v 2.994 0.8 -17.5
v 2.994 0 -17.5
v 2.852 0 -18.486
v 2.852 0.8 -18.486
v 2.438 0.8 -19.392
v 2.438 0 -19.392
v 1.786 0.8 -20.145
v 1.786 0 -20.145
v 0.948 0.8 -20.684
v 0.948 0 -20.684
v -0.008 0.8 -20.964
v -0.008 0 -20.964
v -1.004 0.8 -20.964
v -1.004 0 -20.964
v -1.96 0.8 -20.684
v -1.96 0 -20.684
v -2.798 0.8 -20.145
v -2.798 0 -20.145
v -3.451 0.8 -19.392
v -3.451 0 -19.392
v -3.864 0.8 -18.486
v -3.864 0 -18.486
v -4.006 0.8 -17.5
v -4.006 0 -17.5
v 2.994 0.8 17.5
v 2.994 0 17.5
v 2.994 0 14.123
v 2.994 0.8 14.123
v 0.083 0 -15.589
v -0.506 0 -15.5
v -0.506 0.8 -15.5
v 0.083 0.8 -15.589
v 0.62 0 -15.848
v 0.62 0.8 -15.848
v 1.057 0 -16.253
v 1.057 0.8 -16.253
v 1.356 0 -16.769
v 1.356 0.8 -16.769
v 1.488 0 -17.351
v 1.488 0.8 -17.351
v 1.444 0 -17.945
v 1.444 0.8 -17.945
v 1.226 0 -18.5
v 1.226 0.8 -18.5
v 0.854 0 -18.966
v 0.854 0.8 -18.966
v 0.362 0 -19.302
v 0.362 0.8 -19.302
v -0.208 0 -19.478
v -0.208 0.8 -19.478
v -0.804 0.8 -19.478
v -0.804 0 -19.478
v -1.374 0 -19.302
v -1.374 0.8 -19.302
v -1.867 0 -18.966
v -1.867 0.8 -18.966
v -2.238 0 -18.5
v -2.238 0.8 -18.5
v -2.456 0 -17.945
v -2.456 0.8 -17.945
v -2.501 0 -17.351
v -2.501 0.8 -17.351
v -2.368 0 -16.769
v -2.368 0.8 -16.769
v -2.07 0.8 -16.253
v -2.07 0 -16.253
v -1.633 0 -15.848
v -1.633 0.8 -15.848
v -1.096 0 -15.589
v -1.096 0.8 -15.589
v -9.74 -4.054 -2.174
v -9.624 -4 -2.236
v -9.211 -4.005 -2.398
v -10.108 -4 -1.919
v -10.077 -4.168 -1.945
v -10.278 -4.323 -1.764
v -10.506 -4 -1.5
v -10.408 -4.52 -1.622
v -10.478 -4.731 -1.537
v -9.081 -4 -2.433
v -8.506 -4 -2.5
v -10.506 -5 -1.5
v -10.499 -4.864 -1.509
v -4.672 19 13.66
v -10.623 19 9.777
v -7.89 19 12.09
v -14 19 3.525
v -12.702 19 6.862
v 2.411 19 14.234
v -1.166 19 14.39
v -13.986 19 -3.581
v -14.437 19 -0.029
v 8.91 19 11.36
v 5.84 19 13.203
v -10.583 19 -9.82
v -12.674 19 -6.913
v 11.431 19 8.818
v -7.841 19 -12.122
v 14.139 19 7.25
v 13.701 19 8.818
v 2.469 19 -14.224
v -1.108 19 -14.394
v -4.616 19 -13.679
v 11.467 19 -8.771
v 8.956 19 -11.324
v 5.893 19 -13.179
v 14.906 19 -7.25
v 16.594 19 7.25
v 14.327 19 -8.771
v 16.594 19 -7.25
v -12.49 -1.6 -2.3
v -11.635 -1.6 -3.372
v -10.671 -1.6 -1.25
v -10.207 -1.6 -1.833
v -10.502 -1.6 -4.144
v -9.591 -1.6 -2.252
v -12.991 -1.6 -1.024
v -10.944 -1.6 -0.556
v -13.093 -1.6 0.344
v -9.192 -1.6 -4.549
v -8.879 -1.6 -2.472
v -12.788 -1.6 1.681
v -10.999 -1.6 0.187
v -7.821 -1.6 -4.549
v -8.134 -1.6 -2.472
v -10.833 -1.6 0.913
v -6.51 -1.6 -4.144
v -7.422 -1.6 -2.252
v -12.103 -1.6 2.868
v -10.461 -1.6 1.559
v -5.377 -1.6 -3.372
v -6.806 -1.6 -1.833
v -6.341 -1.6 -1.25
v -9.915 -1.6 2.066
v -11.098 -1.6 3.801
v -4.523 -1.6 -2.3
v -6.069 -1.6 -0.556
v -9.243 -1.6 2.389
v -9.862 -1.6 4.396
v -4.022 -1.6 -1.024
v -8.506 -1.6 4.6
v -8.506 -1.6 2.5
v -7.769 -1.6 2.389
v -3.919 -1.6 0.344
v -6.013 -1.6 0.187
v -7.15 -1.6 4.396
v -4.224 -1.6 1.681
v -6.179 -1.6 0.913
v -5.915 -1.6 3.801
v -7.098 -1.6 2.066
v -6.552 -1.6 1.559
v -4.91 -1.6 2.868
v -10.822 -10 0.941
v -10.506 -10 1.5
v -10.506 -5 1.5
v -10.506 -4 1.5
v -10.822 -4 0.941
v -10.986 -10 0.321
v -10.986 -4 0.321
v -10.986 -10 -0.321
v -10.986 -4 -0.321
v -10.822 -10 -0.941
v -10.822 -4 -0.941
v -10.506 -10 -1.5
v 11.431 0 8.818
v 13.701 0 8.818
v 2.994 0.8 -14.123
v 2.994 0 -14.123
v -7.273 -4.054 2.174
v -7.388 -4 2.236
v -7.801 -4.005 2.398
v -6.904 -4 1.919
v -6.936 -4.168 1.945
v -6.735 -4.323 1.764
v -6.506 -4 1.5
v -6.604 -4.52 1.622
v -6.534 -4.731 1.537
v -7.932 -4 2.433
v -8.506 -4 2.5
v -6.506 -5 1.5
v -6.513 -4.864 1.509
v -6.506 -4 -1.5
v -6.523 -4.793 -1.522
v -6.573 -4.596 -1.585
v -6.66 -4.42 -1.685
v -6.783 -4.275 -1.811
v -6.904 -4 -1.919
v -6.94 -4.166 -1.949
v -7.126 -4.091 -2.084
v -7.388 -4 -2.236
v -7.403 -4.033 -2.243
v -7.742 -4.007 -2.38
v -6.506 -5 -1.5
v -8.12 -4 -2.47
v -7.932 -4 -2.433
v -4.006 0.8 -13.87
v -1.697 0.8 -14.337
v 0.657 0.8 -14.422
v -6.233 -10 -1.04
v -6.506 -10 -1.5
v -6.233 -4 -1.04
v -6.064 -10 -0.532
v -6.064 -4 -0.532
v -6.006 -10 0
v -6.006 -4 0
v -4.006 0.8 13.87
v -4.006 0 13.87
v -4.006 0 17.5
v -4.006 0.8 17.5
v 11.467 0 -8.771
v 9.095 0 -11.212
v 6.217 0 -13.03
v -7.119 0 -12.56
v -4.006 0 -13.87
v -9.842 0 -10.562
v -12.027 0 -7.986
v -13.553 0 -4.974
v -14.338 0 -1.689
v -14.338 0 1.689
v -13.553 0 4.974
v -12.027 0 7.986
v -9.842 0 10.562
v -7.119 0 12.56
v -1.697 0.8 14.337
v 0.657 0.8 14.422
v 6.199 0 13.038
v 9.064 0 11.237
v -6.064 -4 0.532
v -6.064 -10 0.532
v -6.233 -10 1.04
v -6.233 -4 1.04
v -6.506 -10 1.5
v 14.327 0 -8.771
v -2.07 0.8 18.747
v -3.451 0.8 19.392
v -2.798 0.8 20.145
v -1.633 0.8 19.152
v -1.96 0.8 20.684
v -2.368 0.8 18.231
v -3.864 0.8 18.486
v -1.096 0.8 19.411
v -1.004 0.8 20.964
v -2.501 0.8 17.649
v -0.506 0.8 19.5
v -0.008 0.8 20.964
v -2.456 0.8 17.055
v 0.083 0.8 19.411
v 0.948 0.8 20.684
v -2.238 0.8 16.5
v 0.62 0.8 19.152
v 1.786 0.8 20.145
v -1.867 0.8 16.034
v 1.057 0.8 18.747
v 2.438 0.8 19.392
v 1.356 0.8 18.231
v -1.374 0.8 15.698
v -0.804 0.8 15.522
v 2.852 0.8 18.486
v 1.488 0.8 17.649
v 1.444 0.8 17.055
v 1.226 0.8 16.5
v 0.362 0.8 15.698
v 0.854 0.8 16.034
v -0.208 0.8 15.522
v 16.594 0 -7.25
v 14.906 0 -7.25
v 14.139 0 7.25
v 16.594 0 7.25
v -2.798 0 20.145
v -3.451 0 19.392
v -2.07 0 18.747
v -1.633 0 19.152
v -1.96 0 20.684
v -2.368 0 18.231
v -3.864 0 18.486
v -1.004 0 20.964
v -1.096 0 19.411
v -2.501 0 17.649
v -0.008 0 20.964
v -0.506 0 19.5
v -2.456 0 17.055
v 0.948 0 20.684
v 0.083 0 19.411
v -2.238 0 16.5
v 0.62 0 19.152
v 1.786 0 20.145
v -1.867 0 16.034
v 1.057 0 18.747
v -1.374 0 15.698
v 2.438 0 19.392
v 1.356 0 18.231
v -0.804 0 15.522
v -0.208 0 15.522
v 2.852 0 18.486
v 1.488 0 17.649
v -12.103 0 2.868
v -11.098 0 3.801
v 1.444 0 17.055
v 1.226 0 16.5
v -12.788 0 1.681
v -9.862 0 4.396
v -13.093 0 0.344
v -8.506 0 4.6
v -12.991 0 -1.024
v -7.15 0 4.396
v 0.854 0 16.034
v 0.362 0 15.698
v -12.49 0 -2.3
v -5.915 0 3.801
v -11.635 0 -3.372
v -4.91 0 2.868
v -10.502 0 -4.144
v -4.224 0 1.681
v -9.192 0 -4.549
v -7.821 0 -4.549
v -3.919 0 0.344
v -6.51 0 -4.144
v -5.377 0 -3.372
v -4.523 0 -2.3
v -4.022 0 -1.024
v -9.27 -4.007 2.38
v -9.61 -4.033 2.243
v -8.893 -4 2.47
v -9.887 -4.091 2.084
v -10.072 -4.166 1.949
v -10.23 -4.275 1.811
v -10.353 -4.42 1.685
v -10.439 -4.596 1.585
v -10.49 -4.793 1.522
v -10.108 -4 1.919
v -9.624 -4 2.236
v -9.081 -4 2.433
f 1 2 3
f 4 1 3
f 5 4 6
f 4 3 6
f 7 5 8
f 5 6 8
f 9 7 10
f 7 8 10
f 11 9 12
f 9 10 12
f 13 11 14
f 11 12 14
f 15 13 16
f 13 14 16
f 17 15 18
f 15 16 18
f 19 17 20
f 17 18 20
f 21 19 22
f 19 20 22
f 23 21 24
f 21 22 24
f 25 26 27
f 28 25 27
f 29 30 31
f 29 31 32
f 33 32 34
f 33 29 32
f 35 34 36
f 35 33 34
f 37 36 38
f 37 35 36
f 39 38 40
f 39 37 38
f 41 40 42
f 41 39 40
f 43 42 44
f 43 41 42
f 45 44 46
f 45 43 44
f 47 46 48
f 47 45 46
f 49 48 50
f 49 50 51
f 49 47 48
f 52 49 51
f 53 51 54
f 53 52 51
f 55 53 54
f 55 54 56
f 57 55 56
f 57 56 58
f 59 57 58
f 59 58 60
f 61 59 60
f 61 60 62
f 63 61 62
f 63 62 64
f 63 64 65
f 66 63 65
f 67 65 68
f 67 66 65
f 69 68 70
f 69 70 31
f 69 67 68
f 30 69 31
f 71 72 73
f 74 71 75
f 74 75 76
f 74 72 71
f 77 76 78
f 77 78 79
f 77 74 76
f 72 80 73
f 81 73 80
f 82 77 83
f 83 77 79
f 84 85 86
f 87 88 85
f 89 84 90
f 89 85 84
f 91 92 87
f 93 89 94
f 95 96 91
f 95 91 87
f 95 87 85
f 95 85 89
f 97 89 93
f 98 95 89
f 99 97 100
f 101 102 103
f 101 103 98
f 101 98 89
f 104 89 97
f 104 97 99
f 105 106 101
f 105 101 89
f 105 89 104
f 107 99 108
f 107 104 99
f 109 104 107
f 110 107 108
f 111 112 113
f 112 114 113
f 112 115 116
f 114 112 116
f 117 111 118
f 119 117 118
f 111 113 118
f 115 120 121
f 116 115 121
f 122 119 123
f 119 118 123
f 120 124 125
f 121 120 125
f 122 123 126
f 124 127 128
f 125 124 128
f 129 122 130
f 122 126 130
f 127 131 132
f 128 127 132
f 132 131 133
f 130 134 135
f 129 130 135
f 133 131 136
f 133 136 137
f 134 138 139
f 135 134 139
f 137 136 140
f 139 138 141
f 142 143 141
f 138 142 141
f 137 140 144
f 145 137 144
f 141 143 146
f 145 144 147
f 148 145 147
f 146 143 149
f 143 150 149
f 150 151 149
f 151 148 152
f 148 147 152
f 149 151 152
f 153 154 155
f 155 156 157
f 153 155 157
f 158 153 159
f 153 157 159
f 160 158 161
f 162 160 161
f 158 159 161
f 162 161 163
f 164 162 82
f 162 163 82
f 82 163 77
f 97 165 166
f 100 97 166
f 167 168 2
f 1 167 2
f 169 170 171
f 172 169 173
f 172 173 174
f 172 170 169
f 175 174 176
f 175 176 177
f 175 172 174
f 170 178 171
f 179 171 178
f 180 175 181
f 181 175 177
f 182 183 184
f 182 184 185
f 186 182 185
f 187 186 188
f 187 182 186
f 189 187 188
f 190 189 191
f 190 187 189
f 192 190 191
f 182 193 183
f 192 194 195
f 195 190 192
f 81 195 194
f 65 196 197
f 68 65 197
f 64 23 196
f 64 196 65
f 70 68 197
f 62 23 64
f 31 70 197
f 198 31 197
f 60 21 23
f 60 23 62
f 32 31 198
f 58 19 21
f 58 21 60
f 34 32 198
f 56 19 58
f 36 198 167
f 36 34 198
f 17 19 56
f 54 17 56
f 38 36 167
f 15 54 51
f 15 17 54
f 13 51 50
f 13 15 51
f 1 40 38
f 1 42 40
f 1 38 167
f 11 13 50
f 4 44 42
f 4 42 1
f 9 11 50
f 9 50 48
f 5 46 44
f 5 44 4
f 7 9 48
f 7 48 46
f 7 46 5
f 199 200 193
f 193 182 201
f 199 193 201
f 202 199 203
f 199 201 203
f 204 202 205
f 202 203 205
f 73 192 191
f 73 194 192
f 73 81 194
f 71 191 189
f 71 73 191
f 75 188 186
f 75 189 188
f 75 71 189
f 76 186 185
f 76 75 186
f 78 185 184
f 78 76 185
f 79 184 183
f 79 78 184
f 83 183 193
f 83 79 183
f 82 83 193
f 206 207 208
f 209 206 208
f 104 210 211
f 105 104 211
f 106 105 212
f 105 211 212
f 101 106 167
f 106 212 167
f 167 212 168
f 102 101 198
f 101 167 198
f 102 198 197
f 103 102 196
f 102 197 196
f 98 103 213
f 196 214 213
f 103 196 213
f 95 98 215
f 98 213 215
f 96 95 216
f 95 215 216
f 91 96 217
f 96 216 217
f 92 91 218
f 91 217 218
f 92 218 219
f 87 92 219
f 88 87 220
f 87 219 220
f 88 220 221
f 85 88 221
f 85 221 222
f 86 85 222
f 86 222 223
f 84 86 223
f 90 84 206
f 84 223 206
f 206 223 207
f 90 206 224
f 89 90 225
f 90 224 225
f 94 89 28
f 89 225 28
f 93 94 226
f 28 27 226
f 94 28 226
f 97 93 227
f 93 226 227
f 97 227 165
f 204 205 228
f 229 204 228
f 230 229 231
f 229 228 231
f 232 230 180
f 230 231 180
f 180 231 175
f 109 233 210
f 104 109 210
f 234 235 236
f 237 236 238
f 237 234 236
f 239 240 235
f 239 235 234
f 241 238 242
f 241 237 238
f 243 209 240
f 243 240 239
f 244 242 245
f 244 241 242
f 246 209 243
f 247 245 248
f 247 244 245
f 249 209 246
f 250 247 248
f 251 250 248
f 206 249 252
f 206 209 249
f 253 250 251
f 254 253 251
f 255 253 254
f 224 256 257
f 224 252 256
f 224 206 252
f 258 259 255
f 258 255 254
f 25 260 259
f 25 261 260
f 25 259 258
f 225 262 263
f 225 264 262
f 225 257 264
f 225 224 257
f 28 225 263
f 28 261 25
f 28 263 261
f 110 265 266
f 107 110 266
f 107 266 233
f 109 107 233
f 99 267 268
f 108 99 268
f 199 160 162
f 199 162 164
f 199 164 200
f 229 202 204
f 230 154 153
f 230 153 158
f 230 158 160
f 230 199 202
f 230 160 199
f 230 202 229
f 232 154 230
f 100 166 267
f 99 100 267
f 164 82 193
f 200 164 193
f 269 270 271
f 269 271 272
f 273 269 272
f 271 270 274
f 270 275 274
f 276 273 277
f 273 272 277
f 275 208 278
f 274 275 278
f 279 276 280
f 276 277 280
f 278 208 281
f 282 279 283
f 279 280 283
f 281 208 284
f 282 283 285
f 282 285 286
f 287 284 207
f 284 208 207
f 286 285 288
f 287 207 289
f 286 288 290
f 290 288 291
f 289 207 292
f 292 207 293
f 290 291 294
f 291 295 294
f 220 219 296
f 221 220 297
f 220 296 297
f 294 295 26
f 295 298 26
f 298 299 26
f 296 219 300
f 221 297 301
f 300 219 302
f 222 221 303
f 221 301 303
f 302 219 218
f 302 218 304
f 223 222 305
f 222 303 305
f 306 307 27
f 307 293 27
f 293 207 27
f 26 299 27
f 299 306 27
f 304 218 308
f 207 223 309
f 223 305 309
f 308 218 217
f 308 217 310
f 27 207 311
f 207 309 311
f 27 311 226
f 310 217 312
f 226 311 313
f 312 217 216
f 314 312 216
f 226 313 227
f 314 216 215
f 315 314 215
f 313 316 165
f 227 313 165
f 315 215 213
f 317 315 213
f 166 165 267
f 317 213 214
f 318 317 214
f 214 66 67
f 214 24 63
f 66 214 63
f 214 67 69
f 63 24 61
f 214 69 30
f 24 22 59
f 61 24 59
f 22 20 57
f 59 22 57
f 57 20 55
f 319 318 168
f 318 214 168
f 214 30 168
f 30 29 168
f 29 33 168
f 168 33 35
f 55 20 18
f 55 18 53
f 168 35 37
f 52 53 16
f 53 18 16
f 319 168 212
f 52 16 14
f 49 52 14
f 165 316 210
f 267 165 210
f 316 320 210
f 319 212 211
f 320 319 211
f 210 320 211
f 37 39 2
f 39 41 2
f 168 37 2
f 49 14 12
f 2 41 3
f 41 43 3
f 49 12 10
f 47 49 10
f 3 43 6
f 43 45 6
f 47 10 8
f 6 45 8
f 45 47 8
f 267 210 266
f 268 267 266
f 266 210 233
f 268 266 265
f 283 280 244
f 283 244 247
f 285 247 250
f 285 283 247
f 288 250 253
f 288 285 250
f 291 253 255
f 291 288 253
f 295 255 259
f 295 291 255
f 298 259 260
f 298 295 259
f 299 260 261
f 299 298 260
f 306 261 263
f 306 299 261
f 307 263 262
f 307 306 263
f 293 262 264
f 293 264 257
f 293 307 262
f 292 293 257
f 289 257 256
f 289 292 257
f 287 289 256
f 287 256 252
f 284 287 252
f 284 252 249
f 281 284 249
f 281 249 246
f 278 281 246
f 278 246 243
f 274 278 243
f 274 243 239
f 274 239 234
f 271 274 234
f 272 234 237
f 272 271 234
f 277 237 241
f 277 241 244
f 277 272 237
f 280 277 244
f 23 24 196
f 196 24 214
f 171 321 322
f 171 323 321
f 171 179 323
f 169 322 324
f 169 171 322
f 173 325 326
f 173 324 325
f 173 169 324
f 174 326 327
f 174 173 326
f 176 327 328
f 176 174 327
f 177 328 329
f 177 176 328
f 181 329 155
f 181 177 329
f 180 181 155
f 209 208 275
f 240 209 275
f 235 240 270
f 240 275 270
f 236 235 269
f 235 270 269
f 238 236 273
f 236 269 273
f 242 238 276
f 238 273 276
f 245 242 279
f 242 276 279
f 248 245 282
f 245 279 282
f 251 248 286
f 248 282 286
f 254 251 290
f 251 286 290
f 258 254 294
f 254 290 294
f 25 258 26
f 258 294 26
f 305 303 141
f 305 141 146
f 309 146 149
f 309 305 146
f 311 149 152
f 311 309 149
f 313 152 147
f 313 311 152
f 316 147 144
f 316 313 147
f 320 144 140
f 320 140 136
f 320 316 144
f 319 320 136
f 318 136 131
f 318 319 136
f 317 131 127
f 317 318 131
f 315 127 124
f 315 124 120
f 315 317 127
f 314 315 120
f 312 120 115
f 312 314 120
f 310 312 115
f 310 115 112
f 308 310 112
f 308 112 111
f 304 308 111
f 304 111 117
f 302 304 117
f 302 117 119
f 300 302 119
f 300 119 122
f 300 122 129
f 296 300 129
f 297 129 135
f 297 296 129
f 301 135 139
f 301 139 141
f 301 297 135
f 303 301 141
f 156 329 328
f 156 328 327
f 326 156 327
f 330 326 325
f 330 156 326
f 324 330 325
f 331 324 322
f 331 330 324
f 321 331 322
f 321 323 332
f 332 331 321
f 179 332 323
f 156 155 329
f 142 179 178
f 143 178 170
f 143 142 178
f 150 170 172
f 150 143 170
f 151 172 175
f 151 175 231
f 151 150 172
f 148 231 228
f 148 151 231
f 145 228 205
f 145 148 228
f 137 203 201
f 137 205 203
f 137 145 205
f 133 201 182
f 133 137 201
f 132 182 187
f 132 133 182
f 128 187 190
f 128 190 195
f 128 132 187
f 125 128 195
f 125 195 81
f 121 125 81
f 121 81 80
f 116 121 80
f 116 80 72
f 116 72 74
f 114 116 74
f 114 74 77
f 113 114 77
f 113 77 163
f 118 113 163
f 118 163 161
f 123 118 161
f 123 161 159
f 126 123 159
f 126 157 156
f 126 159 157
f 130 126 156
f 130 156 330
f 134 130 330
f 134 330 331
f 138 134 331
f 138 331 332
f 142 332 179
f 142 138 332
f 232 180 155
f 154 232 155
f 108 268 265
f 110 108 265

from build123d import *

# Parameters (mm, degrees)
SKETCH1_R           = 4.6
SKETCH1_R_2         = 2.5
BOSS_EXTRUDE1_DEPTH = 19
SKETCH1_3_R         = 4.6
SKETCH1_3_R_2       = 2.5
SKETCH1_3_R_3       = 2
BOSS_EXTRUDE2_DEPTH = 1.6
SKETCH1_4_R         = 2
BOSS_EXTRUDE3_DEPTH = 0.8
SKETCH1_5_R         = 2.5
BOSS_EXTRUDE4_DEPTH = 4
BOSS_EXTRUDE5_DEPTH = 6
FILLET1_R           = 1
FILLET2_R           = 1


with BuildPart() as part:
    # Sketch1 → Boss-Extrude1 (new body)
    # profile 1 of 3: a face of its own
    with BuildSketch(Plane(origin=(0, 0, 0), x_dir=(1, 0, 0), z_dir=(0, 1, 0))):
        with BuildLine():
            ThreePointArc((11.466935703, 8.771283954), (-14.436938211, 0.029184365), (11.431379714, -8.817573048))
            Line((11.431379714, -8.817573048), (13.700622891, -8.817573048))
            Line((13.700622891, -8.817573048), (14.138880413, -7.25))
            Line((14.138880413, -7.25), (16.593765248, -7.25))
            Line((16.593765248, -7.25), (16.593765248, 7.25))
            Line((16.593765248, 7.25), (14.905644331, 7.25))
            Line((14.905644331, 7.25), (14.326809253, 8.771283954))
            Line((14.326809253, 8.771283954), (11.466935703, 8.771283954))
        make_face()
        with Locations((-8.506234752, 0)):
            Circle(SKETCH1_R, mode=Mode.SUBTRACT)
    # profile 2 of 3: a face of its own
    with BuildSketch(Plane(origin=(0, 0, 0), x_dir=(1, 0, 0), z_dir=(0, 1, 0))):
        with Locations((-8.506234752, 0)):
            Circle(SKETCH1_R)
        with Locations((-8.506234752, 0)):
            Circle(SKETCH1_R_2, mode=Mode.SUBTRACT)
    # profile 3 of 3: a face of its own
    with BuildSketch(Plane(origin=(0, 0, 0), x_dir=(1, 0, 0), z_dir=(0, 1, 0))):
        with Locations((-8.506234752, 0)):
            Circle(SKETCH1_R_2)
    extrude(amount=BOSS_EXTRUDE1_DEPTH)

    # Sketch1<3> → Boss-Extrude2 (add)
    # profile 1 of 2: a face of its own
    with BuildSketch(Plane(origin=(0, 0, 0), x_dir=(1, 0, 0), z_dir=(0, 1, 0))):
        with Locations(Location((-8.506234752, 0, 0), (0, 0, 270))):
            Circle(SKETCH1_3_R)
        with Locations(Location((-8.506234752, 0, 0), (0, 0, 270))):
            Circle(SKETCH1_3_R_2, mode=Mode.SUBTRACT)
    # profile 2 of 2: a face of its own
    with BuildSketch(Plane(origin=(0, 0, 0), x_dir=(1, 0, 0), z_dir=(0, 1, 0))):
        with Locations((-0.506234752, 17.5)):
            Circle(SKETCH1_3_R_3)
    extrude(amount=-BOSS_EXTRUDE2_DEPTH)


with BuildPart() as boss_extrude2_kept_piece:
    # of the separate pieces the step leaves, the one the design keeps (boss_extrude2_pieces_kept)
    add(part.part.solids().sort_by_distance((11.466935703, 0, -8.771283954))[0])

    # Sketch1<4> → Boss-Extrude3 (add)
    # profile 1 of 2: a face of its own
    with BuildSketch(Plane(origin=(0, 0, 0), x_dir=(1, 0, 0), z_dir=(0, 1, 0))):
        with BuildLine():
            ThreePointArc((-4.006234752, 13.869971872), (-0.52182238, 14.427534025), (2.993765248, 14.123151428))
            Line((2.993765248, 14.123151428), (2.993765248, 17.5))
            ThreePointArc((2.993765248, 17.5), (-0.506234752, 21), (-4.006234752, 17.5))
            Line((-4.006234752, 17.5), (-4.006234752, 13.869971872))
        make_face()
        with Locations(Location((-0.506234752, 17.5, 0), (0, 0, 270))):
            Circle(SKETCH1_4_R, mode=Mode.SUBTRACT)
    # profile 2 of 2: a face of its own
    with BuildSketch(Plane(origin=(0, 0, 0), x_dir=(1, 0, 0), z_dir=(0, 1, 0))):
        with BuildLine():
            ThreePointArc((2.993765248, -14.123151428), (-0.52182238, -14.427534025), (-4.006234752, -13.869971872))
            Line((-4.006234752, -13.869971872), (-4.006234752, -17.5))
            ThreePointArc((-4.006234752, -17.5), (-0.506234752, -21), (2.993765248, -17.5))
            Line((2.993765248, -17.5), (2.993765248, -14.123151428))
        make_face()
        with Locations(Location((-0.506234752, -17.5, 0), (0, 0, 270))):
            Circle(SKETCH1_4_R, mode=Mode.SUBTRACT)
    extrude(amount=BOSS_EXTRUDE3_DEPTH)

    # Sketch1<5> → Boss-Extrude4 (add)
    with BuildSketch(Plane(origin=(0, 0, 0), x_dir=(1, 0, 0), z_dir=(0, 1, 0))):
        with Locations(Location((-8.506234752, 0, 0), (0, 0, 270))):
            Circle(SKETCH1_5_R)
    extrude(amount=-BOSS_EXTRUDE4_DEPTH)

    # Sketch5 → Boss-Extrude5 (add)
    with BuildSketch(Plane.XZ.offset(4)):
        with BuildLine():
            Line((-9.968251002, 1.5), (-10.506234752, 1.5))
            ThreePointArc((-10.506234752, 1.5), (-11.006234752, 0), (-10.506234752, -1.5))
            Line((-10.506234752, -1.5), (-9.968251002, -1.5))
            Line((-9.968251002, -1.5), (-9.968251002, 1.5))
        make_face()
        with BuildLine():
            Line((-6.506234752, 1.5), (-9.968251002, 1.5))
            Line((-9.968251002, 1.5), (-9.968251002, -1.5))
            Line((-9.968251002, -1.5), (-6.506234752, -1.5))
            ThreePointArc((-6.506234752, -1.5), (-6.134526507, -0.790569415), (-6.006234752, 0))
            ThreePointArc((-6.006234752, 0), (-6.134526507, 0.790569415), (-6.506234752, 1.5))
        make_face()
    extrude(amount=BOSS_EXTRUDE5_DEPTH)

    # Fillet1
    # the kernel refuses this fillet: 1 mm, written as the material it adds along each edge
    with BuildSketch(Plane(origin=(-4.006234752, -4, 1.5), x_dir=(0, 0, 1), z_dir=(-1, 0, 0))) as fillet1_piece_1_section:
        with BuildLine():
            CenterArc((FILLET1_R, -FILLET1_R), FILLET1_R, 90, 90)
            Line((0, -FILLET1_R), (0, 0))
            Line((0, 0), (FILLET1_R, 0))
        make_face()
    fillet1_piece_1 = extrude(amount=9, mode=Mode.PRIVATE)
    fillet1_piece_1 = fillet1_piece_1 & Plane(origin=(-8.506234752, -4.243408623, 0), x_dir=(0, 0, 1), z_dir=(0, 1, 0)) * Cylinder(2.5, 22, mode=Mode.PRIVATE)
    add(fillet1_piece_1)

    # Fillet2
    # the kernel refuses this fillet: 1 mm, written as the material it adds along each edge
    with BuildSketch(Plane(origin=(-13.006234752, -4, -1.5), x_dir=(0, 0, -1), z_dir=(1, 0, 0))) as fillet2_piece_1_section:
        with BuildLine():
            CenterArc((FILLET2_R, -FILLET2_R), FILLET2_R, 90, 90)
            Line((0, -FILLET2_R), (0, 0))
            Line((0, 0), (FILLET2_R, 0))
        make_face()
    fillet2_piece_1 = extrude(amount=9, mode=Mode.PRIVATE)
    fillet2_piece_1 = fillet2_piece_1 & Plane(origin=(-8.506234752, -4.243408623, 0), x_dir=(0, 0, 1), z_dir=(0, 1, 0)) * Cylinder(2.5, 22, mode=Mode.PRIVATE)
    add(fillet2_piece_1)


solid = boss_extrude2_kept_piece.part
